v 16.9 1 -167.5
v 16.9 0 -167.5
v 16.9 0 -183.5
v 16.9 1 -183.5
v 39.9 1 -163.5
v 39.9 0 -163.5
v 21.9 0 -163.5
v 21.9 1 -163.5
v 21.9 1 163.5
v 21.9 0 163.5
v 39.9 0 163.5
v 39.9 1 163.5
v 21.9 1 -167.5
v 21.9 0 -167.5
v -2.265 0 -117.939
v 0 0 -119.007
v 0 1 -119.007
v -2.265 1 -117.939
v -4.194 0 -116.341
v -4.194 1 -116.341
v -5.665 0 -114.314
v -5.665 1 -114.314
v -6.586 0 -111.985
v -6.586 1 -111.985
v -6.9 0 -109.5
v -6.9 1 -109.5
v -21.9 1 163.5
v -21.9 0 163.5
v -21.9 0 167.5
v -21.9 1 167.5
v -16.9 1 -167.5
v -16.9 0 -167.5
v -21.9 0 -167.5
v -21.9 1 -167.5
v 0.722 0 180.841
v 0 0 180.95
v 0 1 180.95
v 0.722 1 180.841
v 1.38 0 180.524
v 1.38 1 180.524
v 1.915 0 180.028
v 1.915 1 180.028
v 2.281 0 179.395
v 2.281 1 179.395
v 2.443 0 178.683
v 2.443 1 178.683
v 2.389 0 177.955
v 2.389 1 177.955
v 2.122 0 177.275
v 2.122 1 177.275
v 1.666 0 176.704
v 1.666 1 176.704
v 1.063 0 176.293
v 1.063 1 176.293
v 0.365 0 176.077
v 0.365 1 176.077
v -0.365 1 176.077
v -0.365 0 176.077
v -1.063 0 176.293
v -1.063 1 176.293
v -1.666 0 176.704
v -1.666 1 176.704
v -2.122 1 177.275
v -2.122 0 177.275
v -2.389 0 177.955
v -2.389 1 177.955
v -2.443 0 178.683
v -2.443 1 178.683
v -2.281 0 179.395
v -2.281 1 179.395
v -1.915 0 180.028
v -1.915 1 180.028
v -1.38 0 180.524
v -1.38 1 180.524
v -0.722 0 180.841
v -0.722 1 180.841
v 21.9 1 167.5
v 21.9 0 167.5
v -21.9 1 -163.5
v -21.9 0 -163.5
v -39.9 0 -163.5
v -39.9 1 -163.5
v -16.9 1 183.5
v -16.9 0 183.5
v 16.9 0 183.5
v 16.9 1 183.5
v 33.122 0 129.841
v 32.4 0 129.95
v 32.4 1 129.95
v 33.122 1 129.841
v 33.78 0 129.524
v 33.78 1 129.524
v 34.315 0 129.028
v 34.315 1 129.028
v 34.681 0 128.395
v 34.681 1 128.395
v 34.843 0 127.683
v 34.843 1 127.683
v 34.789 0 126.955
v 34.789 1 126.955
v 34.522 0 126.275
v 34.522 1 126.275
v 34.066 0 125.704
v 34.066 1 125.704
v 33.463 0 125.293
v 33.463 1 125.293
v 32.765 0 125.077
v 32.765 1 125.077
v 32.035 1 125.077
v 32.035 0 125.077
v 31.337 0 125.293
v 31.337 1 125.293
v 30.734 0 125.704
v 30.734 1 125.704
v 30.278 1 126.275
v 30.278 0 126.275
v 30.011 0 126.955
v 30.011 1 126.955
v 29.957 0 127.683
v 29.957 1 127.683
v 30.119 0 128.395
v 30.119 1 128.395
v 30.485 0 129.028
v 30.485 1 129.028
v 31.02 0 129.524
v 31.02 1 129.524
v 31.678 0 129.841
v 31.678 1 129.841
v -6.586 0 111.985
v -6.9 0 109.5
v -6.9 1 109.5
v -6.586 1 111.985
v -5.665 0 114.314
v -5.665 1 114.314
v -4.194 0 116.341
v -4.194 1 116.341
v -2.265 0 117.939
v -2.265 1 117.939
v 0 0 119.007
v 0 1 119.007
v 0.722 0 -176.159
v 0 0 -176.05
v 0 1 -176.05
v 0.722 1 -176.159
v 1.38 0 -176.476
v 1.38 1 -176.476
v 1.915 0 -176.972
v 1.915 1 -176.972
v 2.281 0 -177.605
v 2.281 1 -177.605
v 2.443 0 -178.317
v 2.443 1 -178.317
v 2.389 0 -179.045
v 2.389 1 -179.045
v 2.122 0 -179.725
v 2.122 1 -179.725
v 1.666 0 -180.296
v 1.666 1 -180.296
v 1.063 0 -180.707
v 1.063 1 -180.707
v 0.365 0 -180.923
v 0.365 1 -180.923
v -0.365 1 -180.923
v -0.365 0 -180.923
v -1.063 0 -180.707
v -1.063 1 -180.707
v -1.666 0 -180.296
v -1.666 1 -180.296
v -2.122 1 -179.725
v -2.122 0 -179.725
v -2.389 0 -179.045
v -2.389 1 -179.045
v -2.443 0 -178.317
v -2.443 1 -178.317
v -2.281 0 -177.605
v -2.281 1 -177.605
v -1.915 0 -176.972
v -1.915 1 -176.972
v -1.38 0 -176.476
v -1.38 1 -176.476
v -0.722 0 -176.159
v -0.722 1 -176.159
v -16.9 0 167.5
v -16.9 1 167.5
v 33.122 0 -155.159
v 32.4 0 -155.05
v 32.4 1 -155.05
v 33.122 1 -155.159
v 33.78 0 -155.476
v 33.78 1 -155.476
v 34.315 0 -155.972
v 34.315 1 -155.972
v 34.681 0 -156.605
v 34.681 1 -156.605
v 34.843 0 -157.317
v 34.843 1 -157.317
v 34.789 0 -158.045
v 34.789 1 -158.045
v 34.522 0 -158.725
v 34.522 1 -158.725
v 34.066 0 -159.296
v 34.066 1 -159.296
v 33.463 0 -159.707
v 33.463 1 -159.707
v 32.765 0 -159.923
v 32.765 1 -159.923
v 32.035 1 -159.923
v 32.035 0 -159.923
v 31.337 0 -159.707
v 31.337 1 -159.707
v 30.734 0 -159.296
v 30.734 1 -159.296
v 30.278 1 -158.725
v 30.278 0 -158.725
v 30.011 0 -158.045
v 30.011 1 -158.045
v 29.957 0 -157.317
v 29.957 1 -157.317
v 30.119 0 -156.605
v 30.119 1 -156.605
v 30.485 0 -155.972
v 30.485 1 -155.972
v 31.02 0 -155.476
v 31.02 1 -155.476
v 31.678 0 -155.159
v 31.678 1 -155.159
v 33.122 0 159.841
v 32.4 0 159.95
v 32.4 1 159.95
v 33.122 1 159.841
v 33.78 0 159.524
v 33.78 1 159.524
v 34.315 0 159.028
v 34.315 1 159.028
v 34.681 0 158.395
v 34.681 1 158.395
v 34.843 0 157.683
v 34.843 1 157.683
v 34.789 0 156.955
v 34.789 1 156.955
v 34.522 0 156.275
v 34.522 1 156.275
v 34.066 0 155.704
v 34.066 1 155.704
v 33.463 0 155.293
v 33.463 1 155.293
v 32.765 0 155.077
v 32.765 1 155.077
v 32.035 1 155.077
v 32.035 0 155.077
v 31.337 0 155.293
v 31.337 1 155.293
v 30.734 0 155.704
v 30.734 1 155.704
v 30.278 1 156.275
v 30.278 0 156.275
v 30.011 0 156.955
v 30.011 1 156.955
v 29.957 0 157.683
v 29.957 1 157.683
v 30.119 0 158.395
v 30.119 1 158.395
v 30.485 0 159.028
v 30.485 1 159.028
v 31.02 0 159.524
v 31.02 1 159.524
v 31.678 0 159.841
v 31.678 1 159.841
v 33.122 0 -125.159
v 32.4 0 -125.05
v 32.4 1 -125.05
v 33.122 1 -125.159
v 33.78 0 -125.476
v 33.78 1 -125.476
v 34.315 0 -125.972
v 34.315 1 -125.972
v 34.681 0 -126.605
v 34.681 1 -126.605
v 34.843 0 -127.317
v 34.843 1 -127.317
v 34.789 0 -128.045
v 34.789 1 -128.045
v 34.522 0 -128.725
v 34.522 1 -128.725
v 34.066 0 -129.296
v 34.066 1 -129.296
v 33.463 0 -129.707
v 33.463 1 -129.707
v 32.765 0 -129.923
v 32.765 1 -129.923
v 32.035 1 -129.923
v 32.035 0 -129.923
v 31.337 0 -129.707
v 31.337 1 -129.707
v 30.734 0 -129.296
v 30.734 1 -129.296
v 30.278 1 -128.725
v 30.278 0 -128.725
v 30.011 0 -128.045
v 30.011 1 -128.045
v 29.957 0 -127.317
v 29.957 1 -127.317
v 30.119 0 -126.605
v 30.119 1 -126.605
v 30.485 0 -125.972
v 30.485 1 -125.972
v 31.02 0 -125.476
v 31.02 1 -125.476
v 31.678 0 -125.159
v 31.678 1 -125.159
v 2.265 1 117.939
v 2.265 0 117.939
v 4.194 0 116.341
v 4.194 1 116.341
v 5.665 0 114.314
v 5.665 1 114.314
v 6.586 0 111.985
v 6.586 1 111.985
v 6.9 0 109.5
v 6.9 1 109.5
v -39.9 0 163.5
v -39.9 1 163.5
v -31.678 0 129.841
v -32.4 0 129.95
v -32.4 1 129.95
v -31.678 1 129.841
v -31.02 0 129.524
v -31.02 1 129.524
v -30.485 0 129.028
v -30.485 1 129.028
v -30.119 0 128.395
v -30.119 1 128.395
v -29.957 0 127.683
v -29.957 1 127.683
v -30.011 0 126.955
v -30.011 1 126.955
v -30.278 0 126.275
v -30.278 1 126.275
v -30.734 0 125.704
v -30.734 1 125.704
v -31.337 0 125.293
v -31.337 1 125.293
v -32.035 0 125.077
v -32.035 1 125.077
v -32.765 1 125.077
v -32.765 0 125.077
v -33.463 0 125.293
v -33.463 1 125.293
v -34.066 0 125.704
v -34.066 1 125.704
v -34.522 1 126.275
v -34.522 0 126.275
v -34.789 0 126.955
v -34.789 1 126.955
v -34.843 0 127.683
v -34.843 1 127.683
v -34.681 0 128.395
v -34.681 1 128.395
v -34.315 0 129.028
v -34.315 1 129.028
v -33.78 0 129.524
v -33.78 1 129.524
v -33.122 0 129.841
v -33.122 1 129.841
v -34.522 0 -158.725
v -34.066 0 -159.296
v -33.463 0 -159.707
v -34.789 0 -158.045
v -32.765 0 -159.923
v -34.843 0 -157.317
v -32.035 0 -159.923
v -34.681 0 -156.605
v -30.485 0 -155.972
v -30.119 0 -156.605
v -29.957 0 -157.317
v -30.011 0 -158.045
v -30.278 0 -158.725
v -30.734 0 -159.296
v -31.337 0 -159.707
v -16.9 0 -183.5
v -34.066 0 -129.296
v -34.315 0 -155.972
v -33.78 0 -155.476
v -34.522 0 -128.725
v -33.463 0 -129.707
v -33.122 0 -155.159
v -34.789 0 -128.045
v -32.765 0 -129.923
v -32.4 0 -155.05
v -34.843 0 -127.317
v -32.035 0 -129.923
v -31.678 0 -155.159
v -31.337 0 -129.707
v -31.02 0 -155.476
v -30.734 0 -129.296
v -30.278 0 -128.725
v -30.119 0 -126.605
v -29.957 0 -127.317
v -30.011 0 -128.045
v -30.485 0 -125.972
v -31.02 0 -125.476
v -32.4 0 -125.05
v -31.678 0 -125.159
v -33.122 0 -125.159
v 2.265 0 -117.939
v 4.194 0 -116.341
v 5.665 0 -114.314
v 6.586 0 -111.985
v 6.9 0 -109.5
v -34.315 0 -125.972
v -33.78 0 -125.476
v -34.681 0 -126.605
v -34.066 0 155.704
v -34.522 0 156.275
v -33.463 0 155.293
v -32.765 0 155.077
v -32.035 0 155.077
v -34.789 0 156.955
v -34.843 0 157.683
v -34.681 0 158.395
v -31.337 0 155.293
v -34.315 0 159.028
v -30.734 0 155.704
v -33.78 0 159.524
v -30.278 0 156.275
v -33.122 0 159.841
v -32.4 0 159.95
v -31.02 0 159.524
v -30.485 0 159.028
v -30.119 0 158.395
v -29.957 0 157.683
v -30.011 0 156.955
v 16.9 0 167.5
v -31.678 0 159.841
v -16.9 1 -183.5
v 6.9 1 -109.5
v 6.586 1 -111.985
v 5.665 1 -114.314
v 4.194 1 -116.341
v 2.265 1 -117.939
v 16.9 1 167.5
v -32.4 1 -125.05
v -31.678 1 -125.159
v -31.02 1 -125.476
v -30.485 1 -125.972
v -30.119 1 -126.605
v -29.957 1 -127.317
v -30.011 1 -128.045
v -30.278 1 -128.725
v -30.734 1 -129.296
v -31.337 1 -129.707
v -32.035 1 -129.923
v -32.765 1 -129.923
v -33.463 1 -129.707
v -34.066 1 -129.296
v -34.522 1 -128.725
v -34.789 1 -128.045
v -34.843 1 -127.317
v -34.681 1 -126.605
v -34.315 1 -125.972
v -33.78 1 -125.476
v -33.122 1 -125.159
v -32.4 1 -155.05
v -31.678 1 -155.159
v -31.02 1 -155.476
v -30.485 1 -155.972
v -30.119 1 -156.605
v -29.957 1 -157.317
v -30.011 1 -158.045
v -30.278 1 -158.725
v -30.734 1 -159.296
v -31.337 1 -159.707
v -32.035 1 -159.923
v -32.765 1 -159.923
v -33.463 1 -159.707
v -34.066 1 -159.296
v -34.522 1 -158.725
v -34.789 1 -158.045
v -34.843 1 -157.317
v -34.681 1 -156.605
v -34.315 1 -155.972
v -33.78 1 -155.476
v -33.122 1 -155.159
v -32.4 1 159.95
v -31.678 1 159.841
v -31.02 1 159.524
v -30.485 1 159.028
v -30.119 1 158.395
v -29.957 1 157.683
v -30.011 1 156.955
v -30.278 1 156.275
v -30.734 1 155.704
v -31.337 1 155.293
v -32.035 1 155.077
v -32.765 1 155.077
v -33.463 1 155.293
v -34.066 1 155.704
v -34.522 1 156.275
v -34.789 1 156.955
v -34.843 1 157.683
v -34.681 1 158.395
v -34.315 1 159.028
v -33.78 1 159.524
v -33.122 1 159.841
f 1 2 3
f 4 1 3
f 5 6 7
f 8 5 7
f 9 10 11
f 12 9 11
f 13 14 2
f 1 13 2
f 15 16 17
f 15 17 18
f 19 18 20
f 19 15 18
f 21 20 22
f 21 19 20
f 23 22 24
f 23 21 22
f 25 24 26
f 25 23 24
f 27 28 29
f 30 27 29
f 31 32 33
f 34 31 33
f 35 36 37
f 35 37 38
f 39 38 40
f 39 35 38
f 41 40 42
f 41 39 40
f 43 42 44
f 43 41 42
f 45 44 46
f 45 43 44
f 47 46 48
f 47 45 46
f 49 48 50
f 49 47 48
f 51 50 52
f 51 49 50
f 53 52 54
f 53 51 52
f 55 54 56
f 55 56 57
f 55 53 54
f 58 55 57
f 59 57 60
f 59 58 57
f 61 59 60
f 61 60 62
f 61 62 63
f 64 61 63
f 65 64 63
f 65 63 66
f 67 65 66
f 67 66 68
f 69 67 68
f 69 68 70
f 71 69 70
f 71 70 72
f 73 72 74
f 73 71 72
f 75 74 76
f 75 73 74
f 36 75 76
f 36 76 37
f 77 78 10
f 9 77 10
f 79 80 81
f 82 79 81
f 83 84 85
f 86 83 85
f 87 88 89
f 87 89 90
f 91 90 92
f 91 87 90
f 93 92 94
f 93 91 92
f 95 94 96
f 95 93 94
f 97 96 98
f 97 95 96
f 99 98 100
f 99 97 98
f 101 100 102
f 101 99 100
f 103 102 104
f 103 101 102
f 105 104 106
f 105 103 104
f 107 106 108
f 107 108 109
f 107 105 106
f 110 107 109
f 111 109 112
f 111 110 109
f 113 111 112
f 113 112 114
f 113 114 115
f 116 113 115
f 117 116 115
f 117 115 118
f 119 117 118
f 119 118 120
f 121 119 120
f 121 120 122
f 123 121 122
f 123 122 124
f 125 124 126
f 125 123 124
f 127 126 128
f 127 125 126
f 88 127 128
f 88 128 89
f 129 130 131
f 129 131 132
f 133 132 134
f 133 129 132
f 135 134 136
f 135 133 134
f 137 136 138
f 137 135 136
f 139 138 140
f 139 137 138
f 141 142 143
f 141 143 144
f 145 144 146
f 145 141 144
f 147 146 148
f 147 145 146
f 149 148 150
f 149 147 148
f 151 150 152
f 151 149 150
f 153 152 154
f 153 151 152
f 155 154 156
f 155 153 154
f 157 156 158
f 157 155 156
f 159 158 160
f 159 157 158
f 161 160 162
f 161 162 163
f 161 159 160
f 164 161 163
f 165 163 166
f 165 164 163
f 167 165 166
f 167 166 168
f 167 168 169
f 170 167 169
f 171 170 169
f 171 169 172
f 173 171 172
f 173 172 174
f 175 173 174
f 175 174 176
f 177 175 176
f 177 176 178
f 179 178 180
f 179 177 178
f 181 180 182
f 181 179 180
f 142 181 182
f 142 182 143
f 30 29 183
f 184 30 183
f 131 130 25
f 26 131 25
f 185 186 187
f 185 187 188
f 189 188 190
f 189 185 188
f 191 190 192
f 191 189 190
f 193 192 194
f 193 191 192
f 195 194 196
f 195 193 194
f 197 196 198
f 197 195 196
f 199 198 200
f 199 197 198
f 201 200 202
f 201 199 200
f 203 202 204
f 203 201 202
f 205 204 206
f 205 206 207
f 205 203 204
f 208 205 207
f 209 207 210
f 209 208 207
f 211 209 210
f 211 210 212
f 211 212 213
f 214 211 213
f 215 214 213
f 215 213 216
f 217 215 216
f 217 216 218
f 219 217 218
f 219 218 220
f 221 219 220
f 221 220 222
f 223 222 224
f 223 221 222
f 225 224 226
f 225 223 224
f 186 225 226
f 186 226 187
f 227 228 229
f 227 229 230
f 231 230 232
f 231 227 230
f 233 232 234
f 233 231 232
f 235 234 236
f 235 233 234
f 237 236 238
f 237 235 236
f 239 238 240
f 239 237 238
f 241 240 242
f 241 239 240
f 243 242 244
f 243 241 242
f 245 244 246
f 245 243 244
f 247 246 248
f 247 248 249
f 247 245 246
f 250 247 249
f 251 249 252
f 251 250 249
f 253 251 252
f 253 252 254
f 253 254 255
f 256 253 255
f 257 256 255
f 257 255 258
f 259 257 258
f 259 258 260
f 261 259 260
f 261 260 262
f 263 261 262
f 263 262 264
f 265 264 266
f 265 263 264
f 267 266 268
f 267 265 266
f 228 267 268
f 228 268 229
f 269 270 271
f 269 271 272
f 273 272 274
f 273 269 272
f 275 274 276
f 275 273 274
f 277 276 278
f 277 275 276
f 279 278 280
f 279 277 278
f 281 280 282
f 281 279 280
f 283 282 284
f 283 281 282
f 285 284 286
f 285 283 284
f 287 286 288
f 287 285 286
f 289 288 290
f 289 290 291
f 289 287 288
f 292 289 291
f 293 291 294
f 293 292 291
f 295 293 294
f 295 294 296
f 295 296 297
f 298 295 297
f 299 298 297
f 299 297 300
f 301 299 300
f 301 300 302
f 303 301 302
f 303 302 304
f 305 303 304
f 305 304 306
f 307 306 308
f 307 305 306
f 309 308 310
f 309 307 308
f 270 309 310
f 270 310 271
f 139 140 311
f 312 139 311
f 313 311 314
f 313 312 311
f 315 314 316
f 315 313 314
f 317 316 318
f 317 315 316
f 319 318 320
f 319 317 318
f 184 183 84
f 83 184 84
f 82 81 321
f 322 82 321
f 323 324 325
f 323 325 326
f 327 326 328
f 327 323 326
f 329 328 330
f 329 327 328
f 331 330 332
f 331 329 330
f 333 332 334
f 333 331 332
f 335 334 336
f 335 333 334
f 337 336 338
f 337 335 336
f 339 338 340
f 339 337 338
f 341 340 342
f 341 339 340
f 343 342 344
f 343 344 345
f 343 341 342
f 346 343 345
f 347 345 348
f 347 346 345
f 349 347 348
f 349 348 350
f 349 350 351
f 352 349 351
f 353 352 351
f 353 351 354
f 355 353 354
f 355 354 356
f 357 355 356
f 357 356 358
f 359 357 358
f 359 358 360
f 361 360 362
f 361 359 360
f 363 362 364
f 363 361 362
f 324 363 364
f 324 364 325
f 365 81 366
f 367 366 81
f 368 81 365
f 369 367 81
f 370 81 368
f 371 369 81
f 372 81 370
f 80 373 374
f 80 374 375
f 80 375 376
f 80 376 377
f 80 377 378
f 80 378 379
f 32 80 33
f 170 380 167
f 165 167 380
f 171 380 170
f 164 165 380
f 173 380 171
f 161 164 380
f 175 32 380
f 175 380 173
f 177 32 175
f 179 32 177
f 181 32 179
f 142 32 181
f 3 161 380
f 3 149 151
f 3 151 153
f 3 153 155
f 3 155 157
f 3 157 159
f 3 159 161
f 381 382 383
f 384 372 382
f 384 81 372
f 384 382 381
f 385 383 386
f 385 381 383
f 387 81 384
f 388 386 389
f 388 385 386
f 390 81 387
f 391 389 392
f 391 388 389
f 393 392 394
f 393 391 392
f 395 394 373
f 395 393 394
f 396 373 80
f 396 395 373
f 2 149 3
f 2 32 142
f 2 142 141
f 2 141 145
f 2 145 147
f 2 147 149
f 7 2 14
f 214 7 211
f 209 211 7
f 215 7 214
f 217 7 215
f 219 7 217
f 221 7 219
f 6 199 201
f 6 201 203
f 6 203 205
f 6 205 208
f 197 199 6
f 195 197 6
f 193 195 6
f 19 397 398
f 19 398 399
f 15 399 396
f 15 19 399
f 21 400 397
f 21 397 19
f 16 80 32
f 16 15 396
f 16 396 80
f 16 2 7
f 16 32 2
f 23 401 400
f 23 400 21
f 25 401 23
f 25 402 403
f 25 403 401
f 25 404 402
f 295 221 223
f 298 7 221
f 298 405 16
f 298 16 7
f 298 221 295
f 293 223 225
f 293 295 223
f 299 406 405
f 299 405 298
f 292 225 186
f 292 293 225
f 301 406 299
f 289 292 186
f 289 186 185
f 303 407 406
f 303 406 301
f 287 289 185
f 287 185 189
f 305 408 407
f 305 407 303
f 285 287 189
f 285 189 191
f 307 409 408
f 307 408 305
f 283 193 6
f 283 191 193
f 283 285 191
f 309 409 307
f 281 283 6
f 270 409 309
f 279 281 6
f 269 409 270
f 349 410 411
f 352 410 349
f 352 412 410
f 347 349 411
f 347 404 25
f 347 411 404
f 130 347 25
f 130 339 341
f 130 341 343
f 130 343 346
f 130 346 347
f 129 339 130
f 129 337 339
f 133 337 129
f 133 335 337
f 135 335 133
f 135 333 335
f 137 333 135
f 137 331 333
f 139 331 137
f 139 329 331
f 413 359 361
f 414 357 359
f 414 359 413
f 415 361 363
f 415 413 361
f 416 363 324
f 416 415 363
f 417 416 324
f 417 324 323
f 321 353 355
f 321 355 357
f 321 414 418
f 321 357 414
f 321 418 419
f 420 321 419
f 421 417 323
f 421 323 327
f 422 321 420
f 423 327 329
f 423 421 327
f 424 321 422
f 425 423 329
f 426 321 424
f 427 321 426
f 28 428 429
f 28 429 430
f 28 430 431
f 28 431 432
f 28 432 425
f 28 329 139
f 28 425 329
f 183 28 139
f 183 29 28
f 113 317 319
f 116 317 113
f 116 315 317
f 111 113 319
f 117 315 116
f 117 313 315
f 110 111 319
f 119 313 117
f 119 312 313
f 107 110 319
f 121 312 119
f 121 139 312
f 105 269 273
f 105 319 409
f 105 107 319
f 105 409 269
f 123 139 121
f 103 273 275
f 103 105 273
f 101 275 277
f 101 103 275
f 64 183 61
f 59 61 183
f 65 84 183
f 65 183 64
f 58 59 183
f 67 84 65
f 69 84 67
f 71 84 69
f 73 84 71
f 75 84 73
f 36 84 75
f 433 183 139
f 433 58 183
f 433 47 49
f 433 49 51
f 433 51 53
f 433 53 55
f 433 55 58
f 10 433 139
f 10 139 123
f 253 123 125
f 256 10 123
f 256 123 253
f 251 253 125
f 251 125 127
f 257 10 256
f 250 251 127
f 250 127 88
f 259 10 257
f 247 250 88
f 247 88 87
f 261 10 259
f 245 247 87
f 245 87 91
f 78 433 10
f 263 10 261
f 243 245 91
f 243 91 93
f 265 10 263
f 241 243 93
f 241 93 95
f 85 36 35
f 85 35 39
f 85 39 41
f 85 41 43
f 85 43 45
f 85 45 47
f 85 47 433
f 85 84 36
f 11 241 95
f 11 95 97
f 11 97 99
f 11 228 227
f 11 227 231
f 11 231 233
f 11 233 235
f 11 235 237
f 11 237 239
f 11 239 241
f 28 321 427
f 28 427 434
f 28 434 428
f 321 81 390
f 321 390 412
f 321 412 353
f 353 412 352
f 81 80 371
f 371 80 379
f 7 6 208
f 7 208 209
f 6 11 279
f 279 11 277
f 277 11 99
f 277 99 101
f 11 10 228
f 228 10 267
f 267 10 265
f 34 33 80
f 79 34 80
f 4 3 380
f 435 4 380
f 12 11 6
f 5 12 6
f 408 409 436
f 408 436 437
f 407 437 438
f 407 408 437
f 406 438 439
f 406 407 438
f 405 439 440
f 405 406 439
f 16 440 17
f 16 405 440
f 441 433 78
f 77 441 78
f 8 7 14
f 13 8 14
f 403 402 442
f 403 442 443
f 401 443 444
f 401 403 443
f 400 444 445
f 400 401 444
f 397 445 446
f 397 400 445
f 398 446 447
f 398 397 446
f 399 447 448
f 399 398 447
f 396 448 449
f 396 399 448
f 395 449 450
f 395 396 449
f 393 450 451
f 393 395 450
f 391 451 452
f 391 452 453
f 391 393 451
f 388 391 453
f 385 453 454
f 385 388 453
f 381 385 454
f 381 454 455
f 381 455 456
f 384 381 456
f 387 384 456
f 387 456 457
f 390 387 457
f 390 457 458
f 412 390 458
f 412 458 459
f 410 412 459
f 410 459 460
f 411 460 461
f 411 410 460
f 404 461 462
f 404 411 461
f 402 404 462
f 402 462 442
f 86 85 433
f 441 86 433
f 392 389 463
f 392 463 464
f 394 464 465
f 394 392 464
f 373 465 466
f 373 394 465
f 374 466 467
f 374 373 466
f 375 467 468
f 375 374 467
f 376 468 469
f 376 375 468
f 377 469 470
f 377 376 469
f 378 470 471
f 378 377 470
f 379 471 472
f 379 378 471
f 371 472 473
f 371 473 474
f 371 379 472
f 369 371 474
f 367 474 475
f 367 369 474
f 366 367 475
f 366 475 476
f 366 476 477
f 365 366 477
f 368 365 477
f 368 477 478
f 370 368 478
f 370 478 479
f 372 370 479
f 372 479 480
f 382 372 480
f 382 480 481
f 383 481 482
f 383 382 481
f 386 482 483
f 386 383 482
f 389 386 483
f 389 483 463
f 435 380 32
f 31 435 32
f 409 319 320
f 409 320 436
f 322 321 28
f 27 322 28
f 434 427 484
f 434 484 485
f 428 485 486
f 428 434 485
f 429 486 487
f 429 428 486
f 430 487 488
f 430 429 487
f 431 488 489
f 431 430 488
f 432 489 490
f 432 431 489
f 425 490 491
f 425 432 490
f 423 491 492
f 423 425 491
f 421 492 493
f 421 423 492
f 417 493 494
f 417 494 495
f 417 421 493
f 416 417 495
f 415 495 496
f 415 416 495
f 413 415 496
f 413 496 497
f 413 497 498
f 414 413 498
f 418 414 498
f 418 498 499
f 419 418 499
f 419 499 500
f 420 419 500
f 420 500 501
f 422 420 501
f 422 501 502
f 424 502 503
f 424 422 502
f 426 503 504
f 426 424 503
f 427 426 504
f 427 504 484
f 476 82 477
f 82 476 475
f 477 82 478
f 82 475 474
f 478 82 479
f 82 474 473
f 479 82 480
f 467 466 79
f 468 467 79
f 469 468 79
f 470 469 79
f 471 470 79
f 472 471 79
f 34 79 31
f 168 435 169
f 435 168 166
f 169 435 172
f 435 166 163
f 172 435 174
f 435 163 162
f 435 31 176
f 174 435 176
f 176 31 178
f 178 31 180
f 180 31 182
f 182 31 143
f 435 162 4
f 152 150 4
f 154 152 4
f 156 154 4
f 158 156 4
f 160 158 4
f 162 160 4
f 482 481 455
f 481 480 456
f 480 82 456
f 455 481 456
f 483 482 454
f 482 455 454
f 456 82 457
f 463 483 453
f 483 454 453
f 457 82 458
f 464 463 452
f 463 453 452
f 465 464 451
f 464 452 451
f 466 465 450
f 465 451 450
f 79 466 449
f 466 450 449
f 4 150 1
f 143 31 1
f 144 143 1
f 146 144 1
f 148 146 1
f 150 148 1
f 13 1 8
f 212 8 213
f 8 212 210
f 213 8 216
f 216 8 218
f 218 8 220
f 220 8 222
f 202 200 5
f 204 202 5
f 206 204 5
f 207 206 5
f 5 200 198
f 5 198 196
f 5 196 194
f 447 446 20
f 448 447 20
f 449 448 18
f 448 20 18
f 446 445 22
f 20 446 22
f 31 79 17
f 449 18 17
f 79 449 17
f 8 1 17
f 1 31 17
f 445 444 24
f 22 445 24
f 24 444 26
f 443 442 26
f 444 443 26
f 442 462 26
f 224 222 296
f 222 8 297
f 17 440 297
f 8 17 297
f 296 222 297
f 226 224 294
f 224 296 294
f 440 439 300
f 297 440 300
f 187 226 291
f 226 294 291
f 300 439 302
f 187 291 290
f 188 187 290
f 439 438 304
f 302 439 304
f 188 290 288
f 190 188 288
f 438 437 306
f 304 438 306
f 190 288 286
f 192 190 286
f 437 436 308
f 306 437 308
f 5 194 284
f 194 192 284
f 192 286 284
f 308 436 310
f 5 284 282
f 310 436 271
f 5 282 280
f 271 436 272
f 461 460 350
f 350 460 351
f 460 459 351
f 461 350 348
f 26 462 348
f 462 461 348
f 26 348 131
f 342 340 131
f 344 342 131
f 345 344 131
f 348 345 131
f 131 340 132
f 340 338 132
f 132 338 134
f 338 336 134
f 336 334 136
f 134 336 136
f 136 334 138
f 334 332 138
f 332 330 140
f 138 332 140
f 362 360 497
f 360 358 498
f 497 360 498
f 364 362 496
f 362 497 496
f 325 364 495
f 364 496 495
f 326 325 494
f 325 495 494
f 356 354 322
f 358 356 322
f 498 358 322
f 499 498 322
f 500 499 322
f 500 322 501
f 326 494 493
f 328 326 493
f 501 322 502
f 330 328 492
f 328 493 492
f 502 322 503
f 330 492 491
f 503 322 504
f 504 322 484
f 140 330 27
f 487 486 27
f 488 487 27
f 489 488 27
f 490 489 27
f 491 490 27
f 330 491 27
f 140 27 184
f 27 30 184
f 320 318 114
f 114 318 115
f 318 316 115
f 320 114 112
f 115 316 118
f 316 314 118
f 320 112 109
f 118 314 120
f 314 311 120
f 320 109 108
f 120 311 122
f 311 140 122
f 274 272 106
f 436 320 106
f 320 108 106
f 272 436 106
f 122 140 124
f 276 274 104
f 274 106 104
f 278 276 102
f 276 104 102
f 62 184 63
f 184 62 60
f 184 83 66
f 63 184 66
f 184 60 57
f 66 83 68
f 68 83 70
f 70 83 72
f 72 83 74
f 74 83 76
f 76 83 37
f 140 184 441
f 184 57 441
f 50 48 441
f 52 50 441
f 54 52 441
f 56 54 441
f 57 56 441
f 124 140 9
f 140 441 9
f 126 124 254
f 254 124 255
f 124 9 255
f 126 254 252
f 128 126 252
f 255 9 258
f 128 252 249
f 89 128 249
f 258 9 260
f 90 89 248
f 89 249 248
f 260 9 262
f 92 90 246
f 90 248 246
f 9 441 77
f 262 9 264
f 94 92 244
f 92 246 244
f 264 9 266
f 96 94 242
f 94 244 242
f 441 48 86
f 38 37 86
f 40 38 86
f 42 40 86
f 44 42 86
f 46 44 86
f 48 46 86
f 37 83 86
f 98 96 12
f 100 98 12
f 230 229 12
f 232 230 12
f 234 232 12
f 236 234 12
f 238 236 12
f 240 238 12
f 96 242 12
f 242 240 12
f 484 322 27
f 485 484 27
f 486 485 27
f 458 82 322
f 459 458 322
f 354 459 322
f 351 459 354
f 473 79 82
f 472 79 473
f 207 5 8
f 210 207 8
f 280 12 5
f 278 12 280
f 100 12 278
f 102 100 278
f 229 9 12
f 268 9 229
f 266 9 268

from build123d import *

# Parameters (mm, degrees)
SKETCH1_R           = 2.45
SKETCH1_W           = 13.8
SKETCH1_H           = 239
BOSS_EXTRUDE1_DEPTH = 1
FILLET2_R           = 10


with BuildPart() as part:
    # Sketch1 → Boss-Extrude1 (new body)
    with BuildSketch(Plane(origin=(0, 0, 0), x_dir=(1, 0, 0), z_dir=(0, 1, 0))):
        Polygon((-39.9, -163.5), (-21.9, -163.5), (-21.9, -167.5), (-16.9, -167.5), (-16.9, -183.5), (16.9, -183.5), (16.9, -167.5), (21.9, -167.5), (21.9, -163.5), (39.9, -163.5), (39.9, 163.5), (21.9, 163.5), (21.9, 167.5), (16.9, 167.5), (16.9, 183.5), (-16.9, 183.5), (-16.9, 167.5), (-21.9, 167.5), (-21.9, 163.5), (-39.9, 163.5), align=None)
        with Locations(Location((-32.4, 127.5, 0), (0, 0, 270))):
            Circle(SKETCH1_R, mode=Mode.SUBTRACT)
        with Locations(Location((32.4, 127.5, 0), (0, 0, 270))):
            Circle(SKETCH1_R, mode=Mode.SUBTRACT)
        with Locations(Location((-32.4, -127.5, 0), (0, 0, 270))):
            Circle(SKETCH1_R, mode=Mode.SUBTRACT)
        with Locations(Location((32.4, -127.5, 0), (0, 0, 270))):
            Circle(SKETCH1_R, mode=Mode.SUBTRACT)
        with Locations(Location((-32.4, -157.5, 0), (0, 0, 270))):
            Circle(SKETCH1_R, mode=Mode.SUBTRACT)
        with Locations(Location((32.4, -157.5, 0), (0, 0, 270))):
            Circle(SKETCH1_R, mode=Mode.SUBTRACT)
        with Locations(Location((32.4, 157.5, 0), (0, 0, 270))):
            Circle(SKETCH1_R, mode=Mode.SUBTRACT)
        with Locations(Location((-32.4, 157.5, 0), (0, 0, 270))):
            Circle(SKETCH1_R, mode=Mode.SUBTRACT)
        with Locations(Location((0, 178.5, 0), (0, 0, 270))):
            Circle(SKETCH1_R, mode=Mode.SUBTRACT)
        with Locations(Location((0, -178.5, 0), (0, 0, 270))):
            Circle(SKETCH1_R, mode=Mode.SUBTRACT)
        Rectangle(SKETCH1_W, SKETCH1_H, mode=Mode.SUBTRACT)
    extrude(amount=BOSS_EXTRUDE1_DEPTH)

    # Fillet2
    # the kernel refuses this fillet: 10 mm, written as the material it adds along each edge
    with BuildSketch(Plane(origin=(6.9, 0, -119.5), x_dir=(-1, 0, 0), z_dir=(0, 1, 0)), Plane(origin=(6.9, 0, 119.5), x_dir=(0, 0, -1), z_dir=(0, 1, 0)), Plane(origin=(-6.9, 0, 119.5), x_dir=(1, 0, 0), z_dir=(0, 1, 0))) as fillet2_piece_1:
        with BuildLine():
            CenterArc((FILLET2_R, FILLET2_R), FILLET2_R, 180, 90)
            Line((0, FILLET2_R), (0, 0))
            Line((0, 0), (FILLET2_R, 0))
        make_face()
    extrude(amount=1)
    with BuildSketch(Plane(origin=(-6.9, 0, -119.5), x_dir=(1, 0, 0), z_dir=(0, 1, 0))) as fillet2_piece_2:
        with BuildLine():
            CenterArc((FILLET2_R, -FILLET2_R), FILLET2_R, 90, 90)
            Line((0, -FILLET2_R), (0, 0))
            Line((0, 0), (FILLET2_R, 0))
        make_face()
    extrude(amount=1)


solid = part.part
